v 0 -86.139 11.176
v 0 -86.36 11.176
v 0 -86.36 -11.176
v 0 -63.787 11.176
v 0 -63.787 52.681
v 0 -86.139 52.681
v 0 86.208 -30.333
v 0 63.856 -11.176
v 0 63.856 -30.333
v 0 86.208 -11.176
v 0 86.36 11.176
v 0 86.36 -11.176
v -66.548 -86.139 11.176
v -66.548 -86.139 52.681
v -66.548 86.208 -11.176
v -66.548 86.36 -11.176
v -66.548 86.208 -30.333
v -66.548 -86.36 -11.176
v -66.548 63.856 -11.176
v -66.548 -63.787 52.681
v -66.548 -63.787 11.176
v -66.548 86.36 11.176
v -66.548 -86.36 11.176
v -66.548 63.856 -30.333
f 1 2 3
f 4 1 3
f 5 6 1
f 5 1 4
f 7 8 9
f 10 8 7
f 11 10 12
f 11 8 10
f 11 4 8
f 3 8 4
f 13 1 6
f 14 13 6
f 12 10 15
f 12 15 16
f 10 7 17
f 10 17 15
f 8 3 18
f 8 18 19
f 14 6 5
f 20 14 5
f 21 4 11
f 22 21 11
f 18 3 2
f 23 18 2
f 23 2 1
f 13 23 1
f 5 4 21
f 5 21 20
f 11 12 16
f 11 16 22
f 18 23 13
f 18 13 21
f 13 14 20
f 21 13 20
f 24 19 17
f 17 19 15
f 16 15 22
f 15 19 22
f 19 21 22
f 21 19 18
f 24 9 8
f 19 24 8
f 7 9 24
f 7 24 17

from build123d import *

# Parameters (mm, degrees)
F2_W     = 22.352
F2_H     = 63.5
F3_DEPTH = 66.548
F0_W     = 172.72
F0_H     = 22.352
F4_DEPTH = 66.548
F1_W     = 22.352
F1_H     = 41.148
F5_DEPTH = 66.548


with BuildPart() as f3:
    # F2 (on Right) → F3 (new body)
    with BuildSketch(Plane.YZ):
        with Locations((-74.962673, 20.931003)):
            Rectangle(F2_W, F2_H)
    extrude(amount=-F3_DEPTH)

    # F0 (on Right) → F4 (join)
    with BuildSketch(Plane.YZ):
        Rectangle(F0_W, F0_H)
    extrude(amount=-F4_DEPTH)

    # F1 (on Right) → F5 (join)
    with BuildSketch(Plane.YZ):
        with Locations((75.032448, -9.758694)):
            Rectangle(F1_W, F1_H)
    extrude(amount=-F5_DEPTH)


solid = f3.part
